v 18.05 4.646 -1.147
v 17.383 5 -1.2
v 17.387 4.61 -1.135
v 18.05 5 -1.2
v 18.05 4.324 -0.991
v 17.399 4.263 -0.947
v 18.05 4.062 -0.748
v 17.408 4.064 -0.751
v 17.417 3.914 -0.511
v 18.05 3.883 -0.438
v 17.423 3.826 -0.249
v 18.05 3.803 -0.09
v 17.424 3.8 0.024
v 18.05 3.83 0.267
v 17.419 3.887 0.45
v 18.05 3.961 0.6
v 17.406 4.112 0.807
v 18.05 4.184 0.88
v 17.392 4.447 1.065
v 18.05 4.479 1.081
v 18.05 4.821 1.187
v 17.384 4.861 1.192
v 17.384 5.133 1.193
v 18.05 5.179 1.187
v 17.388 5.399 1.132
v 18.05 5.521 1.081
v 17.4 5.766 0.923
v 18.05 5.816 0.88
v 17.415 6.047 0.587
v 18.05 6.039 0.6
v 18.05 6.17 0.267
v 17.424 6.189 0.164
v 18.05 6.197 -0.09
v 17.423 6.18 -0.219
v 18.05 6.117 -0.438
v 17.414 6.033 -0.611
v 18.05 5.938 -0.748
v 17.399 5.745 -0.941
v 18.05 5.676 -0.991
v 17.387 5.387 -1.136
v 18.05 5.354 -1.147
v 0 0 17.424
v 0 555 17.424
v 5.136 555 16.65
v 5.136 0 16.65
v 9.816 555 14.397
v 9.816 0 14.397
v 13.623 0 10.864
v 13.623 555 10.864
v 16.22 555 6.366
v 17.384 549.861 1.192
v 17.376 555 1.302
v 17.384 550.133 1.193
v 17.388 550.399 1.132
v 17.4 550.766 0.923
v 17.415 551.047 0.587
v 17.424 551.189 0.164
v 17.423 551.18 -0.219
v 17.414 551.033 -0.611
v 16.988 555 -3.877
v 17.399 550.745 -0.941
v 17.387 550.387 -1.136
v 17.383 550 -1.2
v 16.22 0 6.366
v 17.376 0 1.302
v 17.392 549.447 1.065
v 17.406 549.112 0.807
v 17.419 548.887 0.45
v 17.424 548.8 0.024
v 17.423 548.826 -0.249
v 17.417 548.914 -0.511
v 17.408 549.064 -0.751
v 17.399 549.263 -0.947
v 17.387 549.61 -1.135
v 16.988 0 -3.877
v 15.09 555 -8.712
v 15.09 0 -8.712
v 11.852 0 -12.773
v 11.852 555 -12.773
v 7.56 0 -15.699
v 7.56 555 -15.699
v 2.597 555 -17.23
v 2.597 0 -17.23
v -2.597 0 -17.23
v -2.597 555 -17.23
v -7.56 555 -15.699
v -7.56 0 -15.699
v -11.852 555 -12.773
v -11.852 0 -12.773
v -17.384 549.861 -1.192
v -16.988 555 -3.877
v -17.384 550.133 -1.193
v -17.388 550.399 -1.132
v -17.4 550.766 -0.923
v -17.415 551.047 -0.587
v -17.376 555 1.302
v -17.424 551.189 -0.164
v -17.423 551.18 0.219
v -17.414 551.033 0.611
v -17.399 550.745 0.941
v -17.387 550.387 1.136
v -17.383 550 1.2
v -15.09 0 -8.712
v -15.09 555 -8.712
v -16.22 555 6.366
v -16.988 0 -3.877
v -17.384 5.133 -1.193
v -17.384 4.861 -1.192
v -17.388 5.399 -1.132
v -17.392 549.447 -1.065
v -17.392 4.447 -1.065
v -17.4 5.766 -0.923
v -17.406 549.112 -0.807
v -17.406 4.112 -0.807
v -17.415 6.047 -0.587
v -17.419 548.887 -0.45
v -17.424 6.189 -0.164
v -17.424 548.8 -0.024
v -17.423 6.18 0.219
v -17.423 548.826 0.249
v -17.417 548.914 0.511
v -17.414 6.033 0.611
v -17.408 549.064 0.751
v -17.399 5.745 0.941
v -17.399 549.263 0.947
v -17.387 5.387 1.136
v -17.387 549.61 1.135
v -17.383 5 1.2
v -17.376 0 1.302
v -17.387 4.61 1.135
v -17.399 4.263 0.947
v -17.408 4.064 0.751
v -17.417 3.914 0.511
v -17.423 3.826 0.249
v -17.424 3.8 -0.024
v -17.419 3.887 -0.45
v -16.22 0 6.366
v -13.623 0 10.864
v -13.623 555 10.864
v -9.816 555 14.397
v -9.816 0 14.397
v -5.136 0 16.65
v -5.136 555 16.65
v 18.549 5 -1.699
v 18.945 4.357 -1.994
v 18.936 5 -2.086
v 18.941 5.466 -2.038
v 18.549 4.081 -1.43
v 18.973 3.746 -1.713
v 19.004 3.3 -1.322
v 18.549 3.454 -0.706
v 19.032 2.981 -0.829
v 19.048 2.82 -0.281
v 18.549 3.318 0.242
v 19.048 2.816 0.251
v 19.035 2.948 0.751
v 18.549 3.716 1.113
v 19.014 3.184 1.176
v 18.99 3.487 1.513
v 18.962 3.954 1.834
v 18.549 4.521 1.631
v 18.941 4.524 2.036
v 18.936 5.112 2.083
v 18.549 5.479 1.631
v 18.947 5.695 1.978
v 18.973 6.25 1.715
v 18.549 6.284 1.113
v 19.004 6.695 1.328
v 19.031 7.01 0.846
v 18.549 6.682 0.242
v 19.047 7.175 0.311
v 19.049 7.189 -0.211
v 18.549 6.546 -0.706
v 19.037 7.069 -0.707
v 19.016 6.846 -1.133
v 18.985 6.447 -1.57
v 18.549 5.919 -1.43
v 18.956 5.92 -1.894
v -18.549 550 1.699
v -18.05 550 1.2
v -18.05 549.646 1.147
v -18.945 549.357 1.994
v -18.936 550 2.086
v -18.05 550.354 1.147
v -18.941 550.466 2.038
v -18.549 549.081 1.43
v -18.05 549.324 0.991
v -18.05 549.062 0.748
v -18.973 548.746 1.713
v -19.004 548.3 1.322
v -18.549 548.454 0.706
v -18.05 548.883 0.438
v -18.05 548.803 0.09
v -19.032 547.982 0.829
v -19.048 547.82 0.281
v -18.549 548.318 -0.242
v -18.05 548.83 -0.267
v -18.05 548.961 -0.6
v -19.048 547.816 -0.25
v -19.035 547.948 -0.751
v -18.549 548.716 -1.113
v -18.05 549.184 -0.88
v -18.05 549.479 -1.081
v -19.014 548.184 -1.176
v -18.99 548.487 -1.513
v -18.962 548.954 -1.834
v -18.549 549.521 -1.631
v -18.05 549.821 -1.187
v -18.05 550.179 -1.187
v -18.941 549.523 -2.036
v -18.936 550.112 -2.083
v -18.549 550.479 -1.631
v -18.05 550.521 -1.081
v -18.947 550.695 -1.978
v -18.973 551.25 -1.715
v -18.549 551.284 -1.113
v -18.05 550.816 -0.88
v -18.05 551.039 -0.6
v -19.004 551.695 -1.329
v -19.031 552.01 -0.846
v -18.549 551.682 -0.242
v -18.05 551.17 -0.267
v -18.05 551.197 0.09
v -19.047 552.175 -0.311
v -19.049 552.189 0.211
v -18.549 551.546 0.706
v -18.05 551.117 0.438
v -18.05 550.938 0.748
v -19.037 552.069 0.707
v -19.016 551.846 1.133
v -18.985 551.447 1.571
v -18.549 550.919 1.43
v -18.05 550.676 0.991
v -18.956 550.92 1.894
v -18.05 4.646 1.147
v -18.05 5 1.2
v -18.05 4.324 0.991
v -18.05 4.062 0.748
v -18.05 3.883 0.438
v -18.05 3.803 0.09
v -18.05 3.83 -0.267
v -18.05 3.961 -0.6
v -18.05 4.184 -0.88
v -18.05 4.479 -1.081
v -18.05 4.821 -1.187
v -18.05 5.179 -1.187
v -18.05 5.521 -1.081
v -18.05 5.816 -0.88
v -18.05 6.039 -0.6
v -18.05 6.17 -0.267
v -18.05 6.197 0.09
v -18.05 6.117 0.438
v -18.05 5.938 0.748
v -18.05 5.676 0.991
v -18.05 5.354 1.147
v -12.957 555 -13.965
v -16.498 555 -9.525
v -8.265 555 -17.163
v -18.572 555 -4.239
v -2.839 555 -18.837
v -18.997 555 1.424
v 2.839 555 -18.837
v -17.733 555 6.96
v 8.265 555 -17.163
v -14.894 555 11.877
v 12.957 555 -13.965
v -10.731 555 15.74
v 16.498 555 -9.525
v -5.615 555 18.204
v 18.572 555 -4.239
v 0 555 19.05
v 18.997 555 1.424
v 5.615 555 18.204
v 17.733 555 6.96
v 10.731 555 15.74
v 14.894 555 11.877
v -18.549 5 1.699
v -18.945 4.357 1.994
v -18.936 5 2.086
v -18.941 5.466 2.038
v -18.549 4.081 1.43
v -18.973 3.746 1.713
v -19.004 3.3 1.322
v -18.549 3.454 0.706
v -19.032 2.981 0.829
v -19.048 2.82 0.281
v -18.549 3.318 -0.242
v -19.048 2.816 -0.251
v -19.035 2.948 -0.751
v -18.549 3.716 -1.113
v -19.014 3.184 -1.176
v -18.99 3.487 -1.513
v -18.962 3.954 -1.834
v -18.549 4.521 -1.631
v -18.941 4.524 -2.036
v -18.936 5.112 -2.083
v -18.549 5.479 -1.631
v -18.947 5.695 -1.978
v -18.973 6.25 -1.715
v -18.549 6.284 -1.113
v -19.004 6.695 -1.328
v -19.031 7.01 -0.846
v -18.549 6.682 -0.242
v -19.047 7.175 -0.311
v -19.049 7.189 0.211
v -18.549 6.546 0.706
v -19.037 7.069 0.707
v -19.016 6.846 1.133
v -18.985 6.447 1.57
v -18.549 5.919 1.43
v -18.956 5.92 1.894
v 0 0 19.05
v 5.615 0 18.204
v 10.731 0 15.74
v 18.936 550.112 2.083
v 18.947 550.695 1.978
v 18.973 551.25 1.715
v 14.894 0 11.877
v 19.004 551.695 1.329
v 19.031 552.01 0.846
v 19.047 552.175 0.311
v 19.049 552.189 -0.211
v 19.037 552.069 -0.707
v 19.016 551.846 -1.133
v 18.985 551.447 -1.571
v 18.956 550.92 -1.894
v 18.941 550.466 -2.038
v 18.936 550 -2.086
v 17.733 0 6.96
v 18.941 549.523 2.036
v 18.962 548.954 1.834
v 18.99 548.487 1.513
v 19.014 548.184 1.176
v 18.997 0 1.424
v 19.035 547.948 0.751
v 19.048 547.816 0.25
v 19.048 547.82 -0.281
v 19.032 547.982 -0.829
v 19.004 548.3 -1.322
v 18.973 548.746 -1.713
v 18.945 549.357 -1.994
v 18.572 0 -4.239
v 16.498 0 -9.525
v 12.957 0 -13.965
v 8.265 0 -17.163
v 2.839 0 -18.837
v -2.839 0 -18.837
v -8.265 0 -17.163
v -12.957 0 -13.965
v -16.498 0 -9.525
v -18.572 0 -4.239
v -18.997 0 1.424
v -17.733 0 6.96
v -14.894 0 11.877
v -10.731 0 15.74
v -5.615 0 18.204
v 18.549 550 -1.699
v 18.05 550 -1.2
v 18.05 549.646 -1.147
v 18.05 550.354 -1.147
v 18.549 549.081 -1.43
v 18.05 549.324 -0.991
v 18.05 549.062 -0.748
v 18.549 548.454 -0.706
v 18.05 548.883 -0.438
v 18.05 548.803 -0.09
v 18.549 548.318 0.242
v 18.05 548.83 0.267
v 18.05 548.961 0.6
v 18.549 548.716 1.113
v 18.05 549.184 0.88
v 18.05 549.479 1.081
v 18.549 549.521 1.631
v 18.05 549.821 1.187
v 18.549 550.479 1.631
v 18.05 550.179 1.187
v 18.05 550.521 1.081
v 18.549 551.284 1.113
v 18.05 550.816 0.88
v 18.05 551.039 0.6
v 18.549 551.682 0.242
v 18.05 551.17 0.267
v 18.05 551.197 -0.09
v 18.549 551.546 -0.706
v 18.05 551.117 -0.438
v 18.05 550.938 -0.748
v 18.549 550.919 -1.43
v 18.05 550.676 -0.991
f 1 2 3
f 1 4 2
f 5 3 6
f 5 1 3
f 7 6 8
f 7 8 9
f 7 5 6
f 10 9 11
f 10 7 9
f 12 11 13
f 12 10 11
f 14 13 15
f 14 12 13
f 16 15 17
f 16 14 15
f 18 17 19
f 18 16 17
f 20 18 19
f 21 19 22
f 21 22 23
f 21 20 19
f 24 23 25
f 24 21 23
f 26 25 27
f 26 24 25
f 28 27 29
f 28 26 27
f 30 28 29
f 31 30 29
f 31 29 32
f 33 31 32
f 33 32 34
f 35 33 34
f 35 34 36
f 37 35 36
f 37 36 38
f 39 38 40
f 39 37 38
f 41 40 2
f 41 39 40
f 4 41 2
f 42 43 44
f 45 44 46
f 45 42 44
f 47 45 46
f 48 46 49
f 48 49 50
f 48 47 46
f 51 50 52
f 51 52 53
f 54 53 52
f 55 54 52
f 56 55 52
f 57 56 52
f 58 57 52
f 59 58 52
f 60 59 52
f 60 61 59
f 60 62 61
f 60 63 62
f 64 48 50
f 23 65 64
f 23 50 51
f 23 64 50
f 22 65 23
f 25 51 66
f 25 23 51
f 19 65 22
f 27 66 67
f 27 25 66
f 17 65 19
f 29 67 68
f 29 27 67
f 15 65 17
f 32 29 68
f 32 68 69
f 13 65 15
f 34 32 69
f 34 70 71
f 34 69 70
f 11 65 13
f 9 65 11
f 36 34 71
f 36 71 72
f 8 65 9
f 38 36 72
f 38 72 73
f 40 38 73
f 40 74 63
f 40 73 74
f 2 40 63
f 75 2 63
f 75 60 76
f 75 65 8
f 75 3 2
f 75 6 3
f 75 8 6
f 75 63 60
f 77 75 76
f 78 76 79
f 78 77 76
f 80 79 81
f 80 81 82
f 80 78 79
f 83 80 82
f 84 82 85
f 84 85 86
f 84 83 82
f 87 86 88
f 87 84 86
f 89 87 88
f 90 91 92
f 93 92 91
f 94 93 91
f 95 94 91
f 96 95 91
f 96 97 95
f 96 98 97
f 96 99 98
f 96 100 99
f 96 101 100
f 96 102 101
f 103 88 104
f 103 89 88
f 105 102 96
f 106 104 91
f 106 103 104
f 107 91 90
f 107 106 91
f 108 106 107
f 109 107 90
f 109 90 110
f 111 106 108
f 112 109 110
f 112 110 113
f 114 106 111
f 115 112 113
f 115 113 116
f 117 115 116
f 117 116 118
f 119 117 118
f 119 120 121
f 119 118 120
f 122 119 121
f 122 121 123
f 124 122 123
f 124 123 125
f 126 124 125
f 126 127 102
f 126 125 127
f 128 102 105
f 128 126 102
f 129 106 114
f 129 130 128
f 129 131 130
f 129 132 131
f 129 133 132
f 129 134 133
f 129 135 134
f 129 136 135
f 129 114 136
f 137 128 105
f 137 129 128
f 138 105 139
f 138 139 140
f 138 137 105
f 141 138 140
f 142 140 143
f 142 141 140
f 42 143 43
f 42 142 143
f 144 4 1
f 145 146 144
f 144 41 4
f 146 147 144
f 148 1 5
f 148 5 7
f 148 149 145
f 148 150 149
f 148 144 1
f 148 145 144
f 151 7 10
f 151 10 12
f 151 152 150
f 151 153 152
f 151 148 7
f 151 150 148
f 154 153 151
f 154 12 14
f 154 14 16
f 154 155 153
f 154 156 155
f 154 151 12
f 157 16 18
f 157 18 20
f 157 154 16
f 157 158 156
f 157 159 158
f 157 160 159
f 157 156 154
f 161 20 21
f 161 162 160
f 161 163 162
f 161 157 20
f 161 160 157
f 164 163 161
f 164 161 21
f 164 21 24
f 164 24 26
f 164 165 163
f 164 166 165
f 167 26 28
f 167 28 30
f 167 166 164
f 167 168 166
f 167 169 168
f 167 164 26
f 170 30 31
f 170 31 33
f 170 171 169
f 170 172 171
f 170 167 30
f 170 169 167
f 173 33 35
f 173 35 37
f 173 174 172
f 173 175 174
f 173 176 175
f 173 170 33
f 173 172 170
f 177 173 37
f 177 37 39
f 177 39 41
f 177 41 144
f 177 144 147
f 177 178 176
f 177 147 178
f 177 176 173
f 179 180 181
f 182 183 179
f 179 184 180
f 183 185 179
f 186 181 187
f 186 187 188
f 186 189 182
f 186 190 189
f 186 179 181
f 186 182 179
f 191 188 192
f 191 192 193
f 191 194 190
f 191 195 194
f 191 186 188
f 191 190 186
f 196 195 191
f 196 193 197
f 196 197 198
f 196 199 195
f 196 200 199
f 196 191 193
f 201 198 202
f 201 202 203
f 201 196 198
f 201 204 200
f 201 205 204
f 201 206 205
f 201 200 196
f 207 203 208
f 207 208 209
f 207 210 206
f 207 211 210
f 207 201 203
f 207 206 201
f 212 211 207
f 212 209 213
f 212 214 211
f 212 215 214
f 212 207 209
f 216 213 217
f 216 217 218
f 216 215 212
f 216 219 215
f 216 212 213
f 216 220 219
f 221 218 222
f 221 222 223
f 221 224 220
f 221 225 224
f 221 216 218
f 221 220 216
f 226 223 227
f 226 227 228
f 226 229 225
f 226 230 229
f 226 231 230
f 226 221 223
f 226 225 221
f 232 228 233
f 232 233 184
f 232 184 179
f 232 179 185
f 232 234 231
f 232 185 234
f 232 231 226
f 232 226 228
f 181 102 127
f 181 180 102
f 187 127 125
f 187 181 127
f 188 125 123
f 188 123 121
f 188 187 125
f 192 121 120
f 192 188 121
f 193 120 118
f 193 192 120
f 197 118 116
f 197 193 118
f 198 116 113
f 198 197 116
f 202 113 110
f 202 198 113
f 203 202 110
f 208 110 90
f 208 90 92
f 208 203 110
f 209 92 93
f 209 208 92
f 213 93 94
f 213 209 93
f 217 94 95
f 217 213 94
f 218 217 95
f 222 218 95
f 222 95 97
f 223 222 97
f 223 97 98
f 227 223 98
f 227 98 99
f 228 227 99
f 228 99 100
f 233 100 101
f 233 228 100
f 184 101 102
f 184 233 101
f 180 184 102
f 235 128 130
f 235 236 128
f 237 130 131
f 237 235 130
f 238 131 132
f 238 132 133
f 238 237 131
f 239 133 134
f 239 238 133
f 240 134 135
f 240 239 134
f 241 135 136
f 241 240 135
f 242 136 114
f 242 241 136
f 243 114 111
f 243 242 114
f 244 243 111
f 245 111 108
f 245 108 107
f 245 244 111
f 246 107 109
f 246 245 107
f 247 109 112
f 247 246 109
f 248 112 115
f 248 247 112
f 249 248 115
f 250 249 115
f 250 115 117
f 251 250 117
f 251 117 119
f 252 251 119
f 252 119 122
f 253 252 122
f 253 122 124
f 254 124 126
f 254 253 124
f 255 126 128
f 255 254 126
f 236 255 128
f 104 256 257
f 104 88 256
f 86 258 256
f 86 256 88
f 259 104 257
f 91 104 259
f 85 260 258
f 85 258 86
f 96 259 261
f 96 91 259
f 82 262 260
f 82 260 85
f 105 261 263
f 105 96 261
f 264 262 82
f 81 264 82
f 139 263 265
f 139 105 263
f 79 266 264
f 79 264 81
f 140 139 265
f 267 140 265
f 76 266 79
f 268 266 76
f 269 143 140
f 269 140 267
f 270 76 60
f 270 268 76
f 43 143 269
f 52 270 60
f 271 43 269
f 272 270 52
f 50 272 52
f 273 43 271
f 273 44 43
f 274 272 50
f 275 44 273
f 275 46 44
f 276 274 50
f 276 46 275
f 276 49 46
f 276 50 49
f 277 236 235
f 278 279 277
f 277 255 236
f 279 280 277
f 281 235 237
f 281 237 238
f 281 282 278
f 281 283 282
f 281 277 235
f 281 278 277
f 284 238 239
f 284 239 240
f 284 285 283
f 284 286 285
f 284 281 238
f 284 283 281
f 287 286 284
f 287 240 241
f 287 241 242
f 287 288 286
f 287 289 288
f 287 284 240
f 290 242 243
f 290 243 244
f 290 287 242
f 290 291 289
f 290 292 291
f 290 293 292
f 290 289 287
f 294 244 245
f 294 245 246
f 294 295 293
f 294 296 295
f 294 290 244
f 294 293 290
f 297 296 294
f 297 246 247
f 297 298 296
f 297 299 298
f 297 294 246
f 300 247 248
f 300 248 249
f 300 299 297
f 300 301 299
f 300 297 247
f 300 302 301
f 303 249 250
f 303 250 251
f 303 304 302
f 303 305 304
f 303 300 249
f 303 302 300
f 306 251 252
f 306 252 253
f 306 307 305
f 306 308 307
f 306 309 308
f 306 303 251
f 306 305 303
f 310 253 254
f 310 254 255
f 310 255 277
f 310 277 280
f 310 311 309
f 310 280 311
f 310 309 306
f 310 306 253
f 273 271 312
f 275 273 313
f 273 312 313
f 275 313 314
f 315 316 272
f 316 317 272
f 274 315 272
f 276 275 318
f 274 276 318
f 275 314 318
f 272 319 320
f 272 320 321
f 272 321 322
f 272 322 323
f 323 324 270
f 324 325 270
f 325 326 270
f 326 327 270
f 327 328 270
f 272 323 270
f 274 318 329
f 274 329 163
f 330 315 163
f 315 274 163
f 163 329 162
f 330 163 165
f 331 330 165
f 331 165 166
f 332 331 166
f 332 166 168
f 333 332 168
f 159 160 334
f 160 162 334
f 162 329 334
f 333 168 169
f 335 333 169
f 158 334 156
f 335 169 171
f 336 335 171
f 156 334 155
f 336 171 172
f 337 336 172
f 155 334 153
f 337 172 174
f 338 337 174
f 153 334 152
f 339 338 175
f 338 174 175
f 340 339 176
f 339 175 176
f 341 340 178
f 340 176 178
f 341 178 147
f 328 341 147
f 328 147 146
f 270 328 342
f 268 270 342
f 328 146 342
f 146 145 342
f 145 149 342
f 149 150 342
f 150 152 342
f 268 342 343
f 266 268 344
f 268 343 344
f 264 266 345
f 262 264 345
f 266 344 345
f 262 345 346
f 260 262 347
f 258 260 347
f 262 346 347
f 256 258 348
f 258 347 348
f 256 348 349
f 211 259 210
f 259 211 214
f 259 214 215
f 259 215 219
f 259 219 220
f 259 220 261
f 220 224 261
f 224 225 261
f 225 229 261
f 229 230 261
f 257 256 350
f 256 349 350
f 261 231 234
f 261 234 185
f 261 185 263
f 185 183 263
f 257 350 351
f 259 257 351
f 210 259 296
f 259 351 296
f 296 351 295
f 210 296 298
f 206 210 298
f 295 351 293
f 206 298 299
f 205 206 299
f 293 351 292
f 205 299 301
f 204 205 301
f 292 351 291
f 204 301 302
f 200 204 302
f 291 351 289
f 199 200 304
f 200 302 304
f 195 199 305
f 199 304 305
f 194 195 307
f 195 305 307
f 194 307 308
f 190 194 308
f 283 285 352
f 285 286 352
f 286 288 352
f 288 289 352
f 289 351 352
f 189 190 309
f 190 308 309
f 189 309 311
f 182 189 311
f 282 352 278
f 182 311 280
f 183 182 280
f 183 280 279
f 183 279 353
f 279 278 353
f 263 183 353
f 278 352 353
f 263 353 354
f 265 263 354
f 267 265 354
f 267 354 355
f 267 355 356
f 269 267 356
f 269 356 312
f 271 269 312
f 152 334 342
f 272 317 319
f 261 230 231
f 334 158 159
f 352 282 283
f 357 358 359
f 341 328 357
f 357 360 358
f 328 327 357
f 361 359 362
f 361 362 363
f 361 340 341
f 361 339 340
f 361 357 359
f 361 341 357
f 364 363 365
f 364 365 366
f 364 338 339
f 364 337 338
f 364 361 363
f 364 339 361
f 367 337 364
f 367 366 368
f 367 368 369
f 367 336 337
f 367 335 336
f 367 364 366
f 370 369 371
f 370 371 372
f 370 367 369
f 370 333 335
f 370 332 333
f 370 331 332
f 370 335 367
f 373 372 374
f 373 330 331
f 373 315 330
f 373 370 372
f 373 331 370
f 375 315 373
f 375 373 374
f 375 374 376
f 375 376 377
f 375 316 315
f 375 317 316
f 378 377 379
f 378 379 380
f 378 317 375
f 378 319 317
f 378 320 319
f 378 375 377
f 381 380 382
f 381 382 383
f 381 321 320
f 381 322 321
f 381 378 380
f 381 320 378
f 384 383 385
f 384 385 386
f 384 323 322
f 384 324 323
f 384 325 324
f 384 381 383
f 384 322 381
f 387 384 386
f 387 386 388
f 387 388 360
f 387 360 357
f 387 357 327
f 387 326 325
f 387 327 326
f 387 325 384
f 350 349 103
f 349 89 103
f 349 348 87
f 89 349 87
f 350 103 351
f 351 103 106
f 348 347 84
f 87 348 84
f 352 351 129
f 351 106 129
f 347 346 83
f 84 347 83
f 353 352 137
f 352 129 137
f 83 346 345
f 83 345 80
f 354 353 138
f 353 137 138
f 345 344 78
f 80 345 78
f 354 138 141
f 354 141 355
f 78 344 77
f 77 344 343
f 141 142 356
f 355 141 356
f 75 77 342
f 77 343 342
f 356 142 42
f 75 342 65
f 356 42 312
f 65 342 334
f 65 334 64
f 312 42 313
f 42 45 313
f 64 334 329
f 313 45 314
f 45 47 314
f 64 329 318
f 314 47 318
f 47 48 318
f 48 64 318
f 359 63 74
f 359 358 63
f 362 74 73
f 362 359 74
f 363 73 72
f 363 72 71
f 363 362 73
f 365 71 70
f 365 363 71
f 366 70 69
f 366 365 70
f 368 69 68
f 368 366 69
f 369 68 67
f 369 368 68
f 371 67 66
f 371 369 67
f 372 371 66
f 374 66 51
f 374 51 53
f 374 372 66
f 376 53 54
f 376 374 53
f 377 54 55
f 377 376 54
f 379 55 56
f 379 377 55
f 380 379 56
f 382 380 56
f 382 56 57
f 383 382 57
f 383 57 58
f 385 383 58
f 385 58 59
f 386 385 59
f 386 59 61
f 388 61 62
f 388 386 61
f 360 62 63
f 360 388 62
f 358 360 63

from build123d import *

# Parameters (mm, degrees)
SKETCH1_R                                    = 19.05
SKETCH1_R_2                                  = 17.4244
BOSS_EXTRUDE1_DEPTH                          = 555
CSK_FOR_M2_COUNTERSUNK_FLAT_HEAD_SCR_2_COUNT = 2
CSK_FOR_M2_COUNTERSUNK_FLAT_HEAD_SCR_2_PITCH = 545
CIRPATTERN2_COUNT                            = 2


with BuildPart() as part:
    # Sketch1 → Boss-Extrude1 (new body)
    with BuildSketch(Plane(origin=(0, 0, 0), x_dir=(1, 0, 0), z_dir=(0, 1, 0))):
        with Locations(Location((0, 0, 0), (0, 0, 270))):
            Circle(SKETCH1_R)
        with Locations(Location((0, 0, 0), (0, 0, 270))):
            Circle(SKETCH1_R_2, mode=Mode.SUBTRACT)
    extrude(amount=BOSS_EXTRUDE1_DEPTH)

    # Sketch44 → CSK for M2 Countersunk Flat Head Screw10 (revolve, cut)
    with BuildSketch(Plane(origin=(19.05, 5, 0), x_dir=(0, 0, -1), z_dir=(0, 1, 0))):
        Polygon((0, 0), (0, 10.721032743), (1.2, 10), (1.2, 1), (2.2, 0), align=None)
    csk_for_m2_countersunk_flat_head_screw10 = revolve(axis=Axis((25.4, 5, 0), (-1, 0, 0)), mode=Mode.SUBTRACT)

    # CSK for M2 Countersunk Flat Head Scr 2: CSK for M2 Countersunk Flat Head Screw10 ×2
    with Locations(*[(0, i * CSK_FOR_M2_COUNTERSUNK_FLAT_HEAD_SCR_2_PITCH, 0) for i in range(1, CSK_FOR_M2_COUNTERSUNK_FLAT_HEAD_SCR_2_COUNT)]):
        add(csk_for_m2_countersunk_flat_head_screw10, mode=Mode.SUBTRACT)

    # CirPattern2: CSK for M2 Countersunk Flat Head Screw10 ×2 about axis
    cirpattern2_axis = Axis((0, 555, 0), (0, 1, 0))
    for i in range(1, CIRPATTERN2_COUNT):
        add(csk_for_m2_countersunk_flat_head_screw10.rotate(cirpattern2_axis, i * 360 / CIRPATTERN2_COUNT), mode=Mode.SUBTRACT)

    # CirPattern2 copy 1 sketch → CirPattern2 copy 1 (revolve, cut)
    with BuildSketch(Plane(origin=(-19.05, 550, 0), x_dir=(0, 0, 1), z_dir=(0, 1, 0))):
        Polygon((0, 0), (0, 10.721032743), (1.2, 10), (1.2, 1), (2.2, 0), align=None)
    revolve(axis=Axis((-25.4, 550, 0), (1, 0, 0)), mode=Mode.SUBTRACT)


solid = part.part
